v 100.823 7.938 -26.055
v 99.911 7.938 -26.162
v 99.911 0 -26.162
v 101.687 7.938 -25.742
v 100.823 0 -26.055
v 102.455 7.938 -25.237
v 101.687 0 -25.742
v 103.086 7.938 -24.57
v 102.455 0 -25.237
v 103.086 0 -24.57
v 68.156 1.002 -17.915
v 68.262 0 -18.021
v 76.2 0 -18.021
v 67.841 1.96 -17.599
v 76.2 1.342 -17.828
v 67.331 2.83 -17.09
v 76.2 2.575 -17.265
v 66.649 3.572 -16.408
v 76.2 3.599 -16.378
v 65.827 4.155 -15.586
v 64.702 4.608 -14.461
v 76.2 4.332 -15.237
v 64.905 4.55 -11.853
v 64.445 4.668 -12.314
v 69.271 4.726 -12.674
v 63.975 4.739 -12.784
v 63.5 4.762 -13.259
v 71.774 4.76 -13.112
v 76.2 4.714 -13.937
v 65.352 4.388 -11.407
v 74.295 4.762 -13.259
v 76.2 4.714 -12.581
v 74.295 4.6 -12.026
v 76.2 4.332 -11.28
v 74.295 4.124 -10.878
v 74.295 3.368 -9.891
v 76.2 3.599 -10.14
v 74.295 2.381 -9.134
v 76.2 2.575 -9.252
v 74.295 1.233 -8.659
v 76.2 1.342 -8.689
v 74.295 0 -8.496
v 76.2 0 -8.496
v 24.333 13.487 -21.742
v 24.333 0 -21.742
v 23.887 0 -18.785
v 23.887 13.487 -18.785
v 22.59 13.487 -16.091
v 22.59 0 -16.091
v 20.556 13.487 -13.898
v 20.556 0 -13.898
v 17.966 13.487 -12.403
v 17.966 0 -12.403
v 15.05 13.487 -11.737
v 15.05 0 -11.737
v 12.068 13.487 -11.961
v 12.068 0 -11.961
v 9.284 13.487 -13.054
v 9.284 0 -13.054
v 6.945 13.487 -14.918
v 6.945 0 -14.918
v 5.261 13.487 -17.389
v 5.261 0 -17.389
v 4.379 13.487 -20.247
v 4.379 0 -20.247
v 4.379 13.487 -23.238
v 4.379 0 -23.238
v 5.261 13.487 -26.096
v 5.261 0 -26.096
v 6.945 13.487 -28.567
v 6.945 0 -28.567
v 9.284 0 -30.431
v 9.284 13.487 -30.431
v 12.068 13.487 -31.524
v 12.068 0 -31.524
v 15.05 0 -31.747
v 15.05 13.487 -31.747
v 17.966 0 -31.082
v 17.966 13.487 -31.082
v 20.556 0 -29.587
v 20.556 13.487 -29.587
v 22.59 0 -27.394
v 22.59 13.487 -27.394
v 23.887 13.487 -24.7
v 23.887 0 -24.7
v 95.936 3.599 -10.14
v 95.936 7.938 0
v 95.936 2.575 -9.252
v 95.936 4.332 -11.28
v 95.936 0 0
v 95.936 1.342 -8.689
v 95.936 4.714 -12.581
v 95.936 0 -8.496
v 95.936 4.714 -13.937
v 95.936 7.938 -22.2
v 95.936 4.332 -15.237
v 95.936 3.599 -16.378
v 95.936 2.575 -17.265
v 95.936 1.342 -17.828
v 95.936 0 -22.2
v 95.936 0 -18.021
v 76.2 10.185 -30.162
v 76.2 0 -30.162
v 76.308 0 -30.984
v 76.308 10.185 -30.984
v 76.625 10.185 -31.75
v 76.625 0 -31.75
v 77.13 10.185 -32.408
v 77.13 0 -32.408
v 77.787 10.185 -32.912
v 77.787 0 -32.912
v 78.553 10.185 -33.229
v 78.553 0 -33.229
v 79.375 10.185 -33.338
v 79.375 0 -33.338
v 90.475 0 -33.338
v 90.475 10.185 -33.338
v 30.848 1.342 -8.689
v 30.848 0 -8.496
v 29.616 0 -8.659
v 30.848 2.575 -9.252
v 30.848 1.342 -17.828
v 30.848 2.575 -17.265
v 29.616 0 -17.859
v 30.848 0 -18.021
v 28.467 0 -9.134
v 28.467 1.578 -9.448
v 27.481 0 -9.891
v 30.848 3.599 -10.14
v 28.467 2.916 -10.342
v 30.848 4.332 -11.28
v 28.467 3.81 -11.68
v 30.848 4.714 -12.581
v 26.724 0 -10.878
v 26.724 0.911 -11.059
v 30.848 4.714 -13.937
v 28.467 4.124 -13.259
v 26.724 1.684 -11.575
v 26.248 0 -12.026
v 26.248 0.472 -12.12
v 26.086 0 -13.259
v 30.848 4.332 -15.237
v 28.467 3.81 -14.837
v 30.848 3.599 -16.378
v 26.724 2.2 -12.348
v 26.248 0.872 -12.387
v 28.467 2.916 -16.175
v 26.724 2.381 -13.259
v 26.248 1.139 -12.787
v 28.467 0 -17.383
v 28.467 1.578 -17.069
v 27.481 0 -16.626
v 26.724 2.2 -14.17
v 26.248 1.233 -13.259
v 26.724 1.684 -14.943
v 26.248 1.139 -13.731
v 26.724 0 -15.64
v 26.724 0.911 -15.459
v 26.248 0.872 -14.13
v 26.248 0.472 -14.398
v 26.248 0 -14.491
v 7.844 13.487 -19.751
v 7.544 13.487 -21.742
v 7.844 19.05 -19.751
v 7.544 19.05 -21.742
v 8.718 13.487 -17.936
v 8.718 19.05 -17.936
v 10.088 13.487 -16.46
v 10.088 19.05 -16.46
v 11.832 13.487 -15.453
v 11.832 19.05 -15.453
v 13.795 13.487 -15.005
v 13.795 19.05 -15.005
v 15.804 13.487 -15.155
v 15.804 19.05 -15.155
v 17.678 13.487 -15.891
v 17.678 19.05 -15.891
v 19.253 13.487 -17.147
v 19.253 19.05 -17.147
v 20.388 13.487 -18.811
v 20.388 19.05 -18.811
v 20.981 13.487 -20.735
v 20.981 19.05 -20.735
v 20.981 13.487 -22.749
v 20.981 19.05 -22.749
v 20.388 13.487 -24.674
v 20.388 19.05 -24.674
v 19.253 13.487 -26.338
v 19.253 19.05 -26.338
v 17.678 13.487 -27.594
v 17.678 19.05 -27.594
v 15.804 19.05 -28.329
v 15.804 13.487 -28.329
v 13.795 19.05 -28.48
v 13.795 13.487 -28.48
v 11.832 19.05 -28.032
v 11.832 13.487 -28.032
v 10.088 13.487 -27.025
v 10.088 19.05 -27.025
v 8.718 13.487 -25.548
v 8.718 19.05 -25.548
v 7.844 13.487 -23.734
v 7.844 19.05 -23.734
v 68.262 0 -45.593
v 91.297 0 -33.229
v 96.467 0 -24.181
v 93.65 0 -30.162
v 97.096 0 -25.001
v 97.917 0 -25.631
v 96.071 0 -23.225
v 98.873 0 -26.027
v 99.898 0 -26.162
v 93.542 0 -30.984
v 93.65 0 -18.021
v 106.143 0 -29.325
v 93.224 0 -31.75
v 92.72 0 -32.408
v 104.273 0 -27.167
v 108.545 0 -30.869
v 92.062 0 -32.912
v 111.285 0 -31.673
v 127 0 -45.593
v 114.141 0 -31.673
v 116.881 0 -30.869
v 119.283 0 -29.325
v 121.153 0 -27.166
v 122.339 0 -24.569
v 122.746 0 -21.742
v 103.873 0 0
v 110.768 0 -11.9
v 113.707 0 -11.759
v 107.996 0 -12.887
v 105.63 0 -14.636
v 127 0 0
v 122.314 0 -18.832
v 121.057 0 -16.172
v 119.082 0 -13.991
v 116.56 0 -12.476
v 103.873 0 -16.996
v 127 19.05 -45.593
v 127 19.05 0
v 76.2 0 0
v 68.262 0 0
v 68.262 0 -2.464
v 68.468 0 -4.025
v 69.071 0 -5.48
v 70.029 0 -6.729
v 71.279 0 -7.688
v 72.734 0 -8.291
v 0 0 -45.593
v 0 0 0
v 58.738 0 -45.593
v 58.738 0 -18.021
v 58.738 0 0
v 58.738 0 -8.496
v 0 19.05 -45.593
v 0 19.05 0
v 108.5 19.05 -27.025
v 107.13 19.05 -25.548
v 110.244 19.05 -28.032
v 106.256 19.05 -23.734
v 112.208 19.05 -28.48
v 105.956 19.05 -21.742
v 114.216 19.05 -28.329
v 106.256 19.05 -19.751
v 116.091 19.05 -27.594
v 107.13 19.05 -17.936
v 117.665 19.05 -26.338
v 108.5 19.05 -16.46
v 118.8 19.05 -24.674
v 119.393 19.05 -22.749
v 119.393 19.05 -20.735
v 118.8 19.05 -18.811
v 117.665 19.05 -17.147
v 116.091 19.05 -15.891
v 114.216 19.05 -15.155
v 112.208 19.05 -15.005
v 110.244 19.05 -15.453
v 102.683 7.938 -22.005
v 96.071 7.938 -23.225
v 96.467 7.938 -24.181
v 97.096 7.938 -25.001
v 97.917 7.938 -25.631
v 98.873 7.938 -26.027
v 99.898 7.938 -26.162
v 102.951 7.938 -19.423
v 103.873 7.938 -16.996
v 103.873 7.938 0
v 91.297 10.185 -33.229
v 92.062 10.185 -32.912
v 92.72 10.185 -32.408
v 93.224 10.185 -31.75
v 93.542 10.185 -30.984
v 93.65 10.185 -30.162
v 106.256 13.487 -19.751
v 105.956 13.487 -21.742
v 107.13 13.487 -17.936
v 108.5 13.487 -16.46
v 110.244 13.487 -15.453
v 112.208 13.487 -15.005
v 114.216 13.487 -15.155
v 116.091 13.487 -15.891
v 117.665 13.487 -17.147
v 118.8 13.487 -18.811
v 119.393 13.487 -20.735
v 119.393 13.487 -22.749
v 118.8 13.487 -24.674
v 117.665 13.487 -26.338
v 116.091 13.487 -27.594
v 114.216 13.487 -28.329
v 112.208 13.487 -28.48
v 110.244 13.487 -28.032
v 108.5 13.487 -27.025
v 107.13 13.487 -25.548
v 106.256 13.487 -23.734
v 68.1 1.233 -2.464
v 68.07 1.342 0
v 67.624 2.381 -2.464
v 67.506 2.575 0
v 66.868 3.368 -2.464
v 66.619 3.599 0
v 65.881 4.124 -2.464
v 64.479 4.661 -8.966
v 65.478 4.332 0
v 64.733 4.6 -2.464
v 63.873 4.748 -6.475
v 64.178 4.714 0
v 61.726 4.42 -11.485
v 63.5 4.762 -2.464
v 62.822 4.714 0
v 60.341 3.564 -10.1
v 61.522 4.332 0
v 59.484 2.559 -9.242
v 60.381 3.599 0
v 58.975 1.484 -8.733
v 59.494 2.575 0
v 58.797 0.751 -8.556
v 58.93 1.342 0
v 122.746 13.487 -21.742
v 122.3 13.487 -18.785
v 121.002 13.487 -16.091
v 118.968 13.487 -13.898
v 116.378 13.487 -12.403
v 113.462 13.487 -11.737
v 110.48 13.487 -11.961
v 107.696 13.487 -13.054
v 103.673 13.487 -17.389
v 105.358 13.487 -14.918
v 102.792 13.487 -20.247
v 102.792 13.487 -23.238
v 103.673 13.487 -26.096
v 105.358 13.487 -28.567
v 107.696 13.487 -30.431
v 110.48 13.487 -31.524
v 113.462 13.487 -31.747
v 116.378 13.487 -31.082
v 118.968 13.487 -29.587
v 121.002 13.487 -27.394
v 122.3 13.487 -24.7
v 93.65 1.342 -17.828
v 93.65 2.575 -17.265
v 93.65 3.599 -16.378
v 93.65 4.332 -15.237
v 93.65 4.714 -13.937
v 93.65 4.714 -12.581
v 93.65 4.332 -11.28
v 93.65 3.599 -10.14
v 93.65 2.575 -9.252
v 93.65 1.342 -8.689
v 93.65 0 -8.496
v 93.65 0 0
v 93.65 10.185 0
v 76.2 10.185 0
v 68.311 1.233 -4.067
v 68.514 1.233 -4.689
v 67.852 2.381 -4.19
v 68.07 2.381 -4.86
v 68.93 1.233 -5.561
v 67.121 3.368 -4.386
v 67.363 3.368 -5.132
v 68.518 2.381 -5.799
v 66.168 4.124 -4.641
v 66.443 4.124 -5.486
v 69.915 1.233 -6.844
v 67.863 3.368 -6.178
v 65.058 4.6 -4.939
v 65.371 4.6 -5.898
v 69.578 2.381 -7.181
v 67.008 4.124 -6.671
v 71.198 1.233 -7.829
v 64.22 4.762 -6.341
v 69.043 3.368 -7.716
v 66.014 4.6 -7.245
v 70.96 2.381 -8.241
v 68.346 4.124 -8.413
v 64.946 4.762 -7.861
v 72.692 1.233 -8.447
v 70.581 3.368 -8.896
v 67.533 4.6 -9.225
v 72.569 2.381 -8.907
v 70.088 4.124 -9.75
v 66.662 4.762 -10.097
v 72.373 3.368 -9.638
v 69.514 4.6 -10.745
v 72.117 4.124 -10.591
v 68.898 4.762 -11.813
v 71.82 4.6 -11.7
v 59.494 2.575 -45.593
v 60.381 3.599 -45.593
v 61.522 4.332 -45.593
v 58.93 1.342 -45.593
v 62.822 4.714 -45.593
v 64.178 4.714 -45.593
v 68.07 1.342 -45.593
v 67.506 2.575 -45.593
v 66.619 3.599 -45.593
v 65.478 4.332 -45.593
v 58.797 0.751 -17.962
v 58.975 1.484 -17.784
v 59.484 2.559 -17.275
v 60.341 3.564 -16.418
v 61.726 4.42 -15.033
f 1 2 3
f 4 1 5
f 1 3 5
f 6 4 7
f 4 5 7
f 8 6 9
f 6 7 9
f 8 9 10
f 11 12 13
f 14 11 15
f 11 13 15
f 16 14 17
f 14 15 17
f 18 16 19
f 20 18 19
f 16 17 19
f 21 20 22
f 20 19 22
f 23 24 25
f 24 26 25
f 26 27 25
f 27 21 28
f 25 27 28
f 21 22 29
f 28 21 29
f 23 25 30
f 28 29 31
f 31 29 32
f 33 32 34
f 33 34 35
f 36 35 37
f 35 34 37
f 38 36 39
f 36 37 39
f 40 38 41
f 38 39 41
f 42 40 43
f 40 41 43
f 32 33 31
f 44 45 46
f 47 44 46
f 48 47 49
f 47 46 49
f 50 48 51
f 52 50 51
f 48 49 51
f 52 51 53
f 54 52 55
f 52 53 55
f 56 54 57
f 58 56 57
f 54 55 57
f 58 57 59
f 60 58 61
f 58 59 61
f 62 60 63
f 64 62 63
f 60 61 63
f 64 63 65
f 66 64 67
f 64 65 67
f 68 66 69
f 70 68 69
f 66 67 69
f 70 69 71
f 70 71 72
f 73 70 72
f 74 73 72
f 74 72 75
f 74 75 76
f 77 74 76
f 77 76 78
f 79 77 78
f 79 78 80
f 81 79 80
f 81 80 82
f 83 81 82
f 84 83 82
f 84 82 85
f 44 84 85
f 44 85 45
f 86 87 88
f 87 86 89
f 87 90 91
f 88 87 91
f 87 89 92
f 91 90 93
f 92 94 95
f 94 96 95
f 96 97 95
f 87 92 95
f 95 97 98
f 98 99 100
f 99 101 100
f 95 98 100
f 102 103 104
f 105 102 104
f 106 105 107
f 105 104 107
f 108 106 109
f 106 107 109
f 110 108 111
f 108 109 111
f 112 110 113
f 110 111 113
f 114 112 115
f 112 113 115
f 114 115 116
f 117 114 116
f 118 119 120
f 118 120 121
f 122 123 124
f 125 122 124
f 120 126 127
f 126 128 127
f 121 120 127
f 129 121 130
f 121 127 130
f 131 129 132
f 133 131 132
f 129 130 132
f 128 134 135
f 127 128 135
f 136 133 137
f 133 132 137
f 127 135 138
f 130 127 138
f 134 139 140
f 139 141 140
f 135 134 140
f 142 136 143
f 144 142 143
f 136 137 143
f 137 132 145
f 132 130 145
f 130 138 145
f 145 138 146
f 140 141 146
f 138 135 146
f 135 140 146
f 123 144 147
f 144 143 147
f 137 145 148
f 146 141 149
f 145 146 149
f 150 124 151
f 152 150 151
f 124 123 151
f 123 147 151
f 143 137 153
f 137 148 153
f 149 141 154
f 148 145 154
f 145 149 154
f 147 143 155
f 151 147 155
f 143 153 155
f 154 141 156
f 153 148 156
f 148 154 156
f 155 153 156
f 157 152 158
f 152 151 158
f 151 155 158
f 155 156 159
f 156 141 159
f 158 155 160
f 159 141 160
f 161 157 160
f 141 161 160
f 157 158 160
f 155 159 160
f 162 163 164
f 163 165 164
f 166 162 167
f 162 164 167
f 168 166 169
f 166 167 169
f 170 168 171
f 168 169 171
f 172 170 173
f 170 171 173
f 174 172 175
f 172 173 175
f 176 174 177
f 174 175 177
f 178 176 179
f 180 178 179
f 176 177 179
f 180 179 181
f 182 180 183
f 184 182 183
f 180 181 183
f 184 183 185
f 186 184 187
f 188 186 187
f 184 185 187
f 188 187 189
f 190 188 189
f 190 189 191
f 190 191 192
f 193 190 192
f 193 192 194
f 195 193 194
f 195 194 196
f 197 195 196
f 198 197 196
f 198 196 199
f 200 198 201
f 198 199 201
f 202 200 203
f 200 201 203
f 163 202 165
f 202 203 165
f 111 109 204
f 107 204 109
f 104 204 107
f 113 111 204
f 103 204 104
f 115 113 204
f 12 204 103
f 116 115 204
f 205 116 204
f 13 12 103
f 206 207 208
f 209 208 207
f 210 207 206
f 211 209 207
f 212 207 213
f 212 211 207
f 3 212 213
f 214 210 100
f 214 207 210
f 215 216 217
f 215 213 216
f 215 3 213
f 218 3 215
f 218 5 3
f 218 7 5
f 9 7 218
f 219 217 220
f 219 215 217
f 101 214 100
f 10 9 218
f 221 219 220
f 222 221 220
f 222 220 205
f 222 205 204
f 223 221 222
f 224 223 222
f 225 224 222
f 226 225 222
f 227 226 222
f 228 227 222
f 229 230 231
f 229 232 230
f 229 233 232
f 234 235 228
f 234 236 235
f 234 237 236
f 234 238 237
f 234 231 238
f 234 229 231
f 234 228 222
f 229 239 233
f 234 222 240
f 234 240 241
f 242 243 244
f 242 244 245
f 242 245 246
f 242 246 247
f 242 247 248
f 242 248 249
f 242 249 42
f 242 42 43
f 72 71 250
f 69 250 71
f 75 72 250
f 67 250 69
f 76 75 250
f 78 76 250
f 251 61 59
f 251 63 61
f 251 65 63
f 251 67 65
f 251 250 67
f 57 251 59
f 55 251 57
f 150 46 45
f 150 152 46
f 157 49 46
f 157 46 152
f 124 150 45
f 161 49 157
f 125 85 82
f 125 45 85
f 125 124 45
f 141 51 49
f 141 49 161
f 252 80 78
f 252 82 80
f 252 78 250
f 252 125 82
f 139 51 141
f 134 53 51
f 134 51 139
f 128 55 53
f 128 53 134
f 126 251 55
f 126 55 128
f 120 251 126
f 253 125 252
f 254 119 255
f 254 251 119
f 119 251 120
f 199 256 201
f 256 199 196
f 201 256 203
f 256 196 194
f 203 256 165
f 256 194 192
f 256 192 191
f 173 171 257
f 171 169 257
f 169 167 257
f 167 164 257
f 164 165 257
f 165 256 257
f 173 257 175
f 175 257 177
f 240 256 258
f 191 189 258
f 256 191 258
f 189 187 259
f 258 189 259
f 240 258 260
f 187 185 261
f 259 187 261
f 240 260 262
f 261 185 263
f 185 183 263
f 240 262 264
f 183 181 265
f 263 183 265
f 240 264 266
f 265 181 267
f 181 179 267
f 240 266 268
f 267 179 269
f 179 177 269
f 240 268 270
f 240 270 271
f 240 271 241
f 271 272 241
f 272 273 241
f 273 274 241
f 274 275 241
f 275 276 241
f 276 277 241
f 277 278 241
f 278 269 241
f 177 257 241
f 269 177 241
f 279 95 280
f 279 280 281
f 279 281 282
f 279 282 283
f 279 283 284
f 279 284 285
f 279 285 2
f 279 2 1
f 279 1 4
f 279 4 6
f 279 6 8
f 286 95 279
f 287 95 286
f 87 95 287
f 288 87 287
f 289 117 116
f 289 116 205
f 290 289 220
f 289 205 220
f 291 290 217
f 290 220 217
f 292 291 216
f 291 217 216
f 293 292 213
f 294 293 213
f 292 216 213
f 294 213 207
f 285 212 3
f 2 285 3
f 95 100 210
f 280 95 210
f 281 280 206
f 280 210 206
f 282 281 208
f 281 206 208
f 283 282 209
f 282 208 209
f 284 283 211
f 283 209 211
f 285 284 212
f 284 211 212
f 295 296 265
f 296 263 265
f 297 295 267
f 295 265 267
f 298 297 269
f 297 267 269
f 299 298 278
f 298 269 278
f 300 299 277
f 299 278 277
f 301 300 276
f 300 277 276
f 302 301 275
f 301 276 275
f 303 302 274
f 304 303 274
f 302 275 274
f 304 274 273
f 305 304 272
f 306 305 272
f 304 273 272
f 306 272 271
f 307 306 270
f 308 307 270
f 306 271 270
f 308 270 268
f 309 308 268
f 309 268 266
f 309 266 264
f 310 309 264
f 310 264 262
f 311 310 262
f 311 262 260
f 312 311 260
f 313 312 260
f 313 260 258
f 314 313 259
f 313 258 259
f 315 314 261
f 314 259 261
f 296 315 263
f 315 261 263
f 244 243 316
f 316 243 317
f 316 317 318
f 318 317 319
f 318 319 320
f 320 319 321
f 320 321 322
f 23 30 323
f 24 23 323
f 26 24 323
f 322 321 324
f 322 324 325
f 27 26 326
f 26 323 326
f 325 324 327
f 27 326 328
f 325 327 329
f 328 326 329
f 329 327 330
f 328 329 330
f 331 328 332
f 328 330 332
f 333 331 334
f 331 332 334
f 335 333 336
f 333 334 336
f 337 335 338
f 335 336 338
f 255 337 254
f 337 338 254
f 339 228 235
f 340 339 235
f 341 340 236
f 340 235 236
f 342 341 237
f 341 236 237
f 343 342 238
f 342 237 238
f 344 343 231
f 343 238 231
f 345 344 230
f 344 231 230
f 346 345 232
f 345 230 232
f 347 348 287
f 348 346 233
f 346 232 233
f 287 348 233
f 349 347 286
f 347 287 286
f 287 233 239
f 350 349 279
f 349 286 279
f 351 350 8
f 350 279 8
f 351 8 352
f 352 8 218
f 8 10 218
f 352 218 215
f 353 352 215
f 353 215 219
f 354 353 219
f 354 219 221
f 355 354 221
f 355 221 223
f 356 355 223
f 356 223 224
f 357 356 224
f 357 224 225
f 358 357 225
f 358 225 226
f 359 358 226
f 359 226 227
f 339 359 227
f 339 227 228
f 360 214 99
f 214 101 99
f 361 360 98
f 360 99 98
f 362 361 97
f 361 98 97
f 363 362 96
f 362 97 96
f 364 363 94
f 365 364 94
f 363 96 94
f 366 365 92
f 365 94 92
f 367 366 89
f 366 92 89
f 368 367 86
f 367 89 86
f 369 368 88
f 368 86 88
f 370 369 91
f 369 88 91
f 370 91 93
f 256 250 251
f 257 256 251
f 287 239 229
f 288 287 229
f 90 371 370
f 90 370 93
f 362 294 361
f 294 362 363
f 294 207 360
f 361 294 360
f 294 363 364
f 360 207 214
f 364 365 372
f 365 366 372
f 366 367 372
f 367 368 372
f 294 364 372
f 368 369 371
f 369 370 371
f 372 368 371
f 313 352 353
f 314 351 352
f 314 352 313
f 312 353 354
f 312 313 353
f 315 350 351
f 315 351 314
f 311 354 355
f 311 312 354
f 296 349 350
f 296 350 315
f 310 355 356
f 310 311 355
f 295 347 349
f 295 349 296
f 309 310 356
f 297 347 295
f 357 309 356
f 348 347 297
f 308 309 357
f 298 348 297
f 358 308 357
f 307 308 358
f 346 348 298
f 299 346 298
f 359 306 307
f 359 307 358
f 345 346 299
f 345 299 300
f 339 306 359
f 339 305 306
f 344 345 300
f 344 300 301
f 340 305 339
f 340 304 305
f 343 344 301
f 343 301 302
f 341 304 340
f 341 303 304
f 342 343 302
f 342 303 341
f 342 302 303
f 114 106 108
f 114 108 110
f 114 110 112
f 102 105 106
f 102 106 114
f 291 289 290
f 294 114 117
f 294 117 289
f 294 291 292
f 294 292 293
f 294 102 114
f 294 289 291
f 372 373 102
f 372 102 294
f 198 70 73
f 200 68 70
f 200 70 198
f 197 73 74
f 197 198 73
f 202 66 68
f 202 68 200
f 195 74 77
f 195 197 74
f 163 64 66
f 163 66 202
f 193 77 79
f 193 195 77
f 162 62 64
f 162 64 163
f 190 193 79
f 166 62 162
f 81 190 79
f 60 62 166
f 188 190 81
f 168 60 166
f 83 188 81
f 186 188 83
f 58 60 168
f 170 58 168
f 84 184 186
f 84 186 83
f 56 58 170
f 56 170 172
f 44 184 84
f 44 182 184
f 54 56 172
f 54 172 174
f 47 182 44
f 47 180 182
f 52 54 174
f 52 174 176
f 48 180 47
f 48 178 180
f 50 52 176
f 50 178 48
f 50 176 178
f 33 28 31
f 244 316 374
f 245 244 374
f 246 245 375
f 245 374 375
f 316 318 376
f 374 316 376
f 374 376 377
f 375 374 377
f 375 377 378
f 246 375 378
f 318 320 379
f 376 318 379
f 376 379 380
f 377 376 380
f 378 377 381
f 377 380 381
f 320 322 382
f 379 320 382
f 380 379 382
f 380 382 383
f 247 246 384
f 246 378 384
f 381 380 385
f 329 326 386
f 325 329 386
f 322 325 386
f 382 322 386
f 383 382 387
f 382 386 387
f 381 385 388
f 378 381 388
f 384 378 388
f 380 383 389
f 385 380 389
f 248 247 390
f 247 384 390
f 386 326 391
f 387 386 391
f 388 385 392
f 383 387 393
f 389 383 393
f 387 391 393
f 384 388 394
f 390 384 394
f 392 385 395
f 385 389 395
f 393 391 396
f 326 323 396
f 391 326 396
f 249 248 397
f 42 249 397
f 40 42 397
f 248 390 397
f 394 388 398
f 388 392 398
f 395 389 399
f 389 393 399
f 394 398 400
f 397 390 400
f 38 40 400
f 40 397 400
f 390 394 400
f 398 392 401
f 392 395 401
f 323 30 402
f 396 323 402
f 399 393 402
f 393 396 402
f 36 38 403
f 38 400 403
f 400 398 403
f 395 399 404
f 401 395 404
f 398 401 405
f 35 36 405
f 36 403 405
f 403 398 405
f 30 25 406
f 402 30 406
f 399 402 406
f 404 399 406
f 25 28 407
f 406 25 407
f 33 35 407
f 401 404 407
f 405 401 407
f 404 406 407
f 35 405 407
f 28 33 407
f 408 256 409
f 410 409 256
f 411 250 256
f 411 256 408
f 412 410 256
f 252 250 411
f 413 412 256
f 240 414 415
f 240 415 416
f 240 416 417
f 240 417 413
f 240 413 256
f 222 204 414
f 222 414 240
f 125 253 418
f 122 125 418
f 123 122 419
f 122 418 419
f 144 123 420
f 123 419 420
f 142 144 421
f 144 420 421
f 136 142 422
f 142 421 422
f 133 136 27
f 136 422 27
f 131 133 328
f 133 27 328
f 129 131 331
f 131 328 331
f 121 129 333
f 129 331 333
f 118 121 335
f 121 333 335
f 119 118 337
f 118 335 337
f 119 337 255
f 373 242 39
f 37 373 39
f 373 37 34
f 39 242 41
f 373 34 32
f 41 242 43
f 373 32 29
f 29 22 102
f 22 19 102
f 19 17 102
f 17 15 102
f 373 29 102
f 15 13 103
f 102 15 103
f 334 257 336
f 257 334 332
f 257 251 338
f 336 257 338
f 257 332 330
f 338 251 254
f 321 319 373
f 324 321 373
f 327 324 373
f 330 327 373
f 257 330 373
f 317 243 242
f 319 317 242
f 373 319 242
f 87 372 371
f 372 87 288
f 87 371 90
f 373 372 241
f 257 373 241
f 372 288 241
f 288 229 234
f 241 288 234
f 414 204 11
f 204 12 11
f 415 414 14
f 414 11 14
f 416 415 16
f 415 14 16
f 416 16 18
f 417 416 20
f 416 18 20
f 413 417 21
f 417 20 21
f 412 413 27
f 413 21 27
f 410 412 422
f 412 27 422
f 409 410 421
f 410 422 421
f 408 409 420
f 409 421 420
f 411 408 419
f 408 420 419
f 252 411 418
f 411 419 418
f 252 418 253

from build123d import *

# Parameters (mm, degrees)
F0_W           = 127
F0_H           = 45.593
F1_DEPTH       = 19.05
F3_D           = 13.5128
F3_DEPTH       = 19.05
F3_CBORE_D     = 20.066
F3_CBORE_DEPTH = 13.4874
F3_TIP         = 4.0596546864
F5_DEPTH       = 45.593
F7_DEPTH       = 10.1854
F9_DEPTH       = 7.9375
F10_R          = 4.7625
F11_DEPTH      = 69.85
F12_R          = 4.76249
F4_R           = 4.7625


# Not quite as in the source:
# - a fillet or chamfer is up to 0.001 mm smaller than in the source, because OpenCascade refuses the exact size


with BuildPart() as f1:
    # F0 (on Front) → F1 (new body)
    with BuildSketch(Plane.XZ):
        with Locations((63.5, -22.7965)):
            Rectangle(F0_W, F0_H)
    extrude(amount=-F1_DEPTH)

    # F3
    with Locations(Plane.XZ):
        with Locations((14.3002, -21.7424), (112.7125, -21.7424)):
            CounterBoreHole(F3_D / 2, F3_CBORE_D / 2, F3_CBORE_DEPTH, depth=F3_DEPTH)
            with Locations((0, 0, -(F3_DEPTH + F3_TIP / 2))):  # 118° drill point
                Cone(0, F3_D / 2, F3_TIP, mode=Mode.SUBTRACT)

    # F4 (on face) → F5 (cut)
    with BuildSketch(Plane.XY):
        with BuildLine():
            Line((58.7375, 0), (68.2625, 0))
            ThreePointArc((68.2625, 0), (63.5, 4.7625), (58.7375, 0))
        make_face()
        with BuildLine():
            ThreePointArc((58.7375, 0), (63.5, -4.7625), (68.2625, 0))
            Line((68.2625, 0), (58.7375, 0))
        make_face()
    extrude(amount=-F5_DEPTH, mode=Mode.SUBTRACT)

    # F6 (on face) → F7 (cut)
    with BuildSketch(Plane.XZ):
        with BuildLine():
            Line((93.6498, 0), (76.2, 0))
            Line((76.2, 0), (76.2, -30.1625))
            ThreePointArc((76.2, -30.1625), (77.1299359697, -32.4075640303), (79.375, -33.3375))
            Line((79.375, -33.3375), (90.4748, -33.3375))
            ThreePointArc((90.4748, -33.3375), (92.7198640303, -32.4075640303), (93.6498, -30.1625))
            Line((93.6498, -30.1625), (93.6498, 0))
        make_face()
    extrude(amount=-F7_DEPTH, mode=Mode.SUBTRACT)

    # F8 (on Front) → F9 (cut)
    with BuildSketch(Plane.XZ):
        with BuildLine():
            Line((103.8733, 0), (95.9358, 0))
            Line((95.9358, 0), (95.9358, -22.1996))
            ThreePointArc((95.9358, -22.1996), (97.0963600902, -25.0014399098), (99.8982, -26.162))
            Line((99.8982, -26.162), (99.9109, -26.162))
            ThreePointArc((99.9109, -26.162), (102.7127399098, -25.0014399098), (103.8733, -22.1996))
            Line((103.8733, -22.1996), (103.8733, 0))
        make_face()
    extrude(amount=-F9_DEPTH, mode=Mode.SUBTRACT)

    # F10 (on face) → F11 (cut)
    with BuildSketch(Plane.YZ.offset(95.9358)):
        with Locations((0, -13.2588)):
            Circle(F10_R)
    extrude(amount=-F11_DEPTH, mode=Mode.SUBTRACT)

    # F12 (radius 4.7625 in the source; OpenCascade refuses exactly that, so slightly less here)
    f12_edges = [f1.edges().sort_by_distance(p)[0] for p in [
        (26.0858, 4.7625, -13.2588),
    ]]
    fillet(f12_edges, radius=F12_R)

    # F14: sweep along a path in F13
    with BuildLine(Plane.XZ) as f14_path:
        Line((63.5, 0), (63.5, -2.4638))
        ThreePointArc((63.5, -2.4638), (66.6617822971, -10.0970177029), (74.295, -13.2588))
        Line((74.295, -13.2588), (77.6987022404, -13.2588))
    # F4 (on face) → F14 (sweep, cut)
    with BuildSketch(Plane.XY):
        with Locations((63.5, 0)):
            Circle(F4_R)
    sweep(path=f14_path.line, mode=Mode.SUBTRACT)


solid = f1.part
